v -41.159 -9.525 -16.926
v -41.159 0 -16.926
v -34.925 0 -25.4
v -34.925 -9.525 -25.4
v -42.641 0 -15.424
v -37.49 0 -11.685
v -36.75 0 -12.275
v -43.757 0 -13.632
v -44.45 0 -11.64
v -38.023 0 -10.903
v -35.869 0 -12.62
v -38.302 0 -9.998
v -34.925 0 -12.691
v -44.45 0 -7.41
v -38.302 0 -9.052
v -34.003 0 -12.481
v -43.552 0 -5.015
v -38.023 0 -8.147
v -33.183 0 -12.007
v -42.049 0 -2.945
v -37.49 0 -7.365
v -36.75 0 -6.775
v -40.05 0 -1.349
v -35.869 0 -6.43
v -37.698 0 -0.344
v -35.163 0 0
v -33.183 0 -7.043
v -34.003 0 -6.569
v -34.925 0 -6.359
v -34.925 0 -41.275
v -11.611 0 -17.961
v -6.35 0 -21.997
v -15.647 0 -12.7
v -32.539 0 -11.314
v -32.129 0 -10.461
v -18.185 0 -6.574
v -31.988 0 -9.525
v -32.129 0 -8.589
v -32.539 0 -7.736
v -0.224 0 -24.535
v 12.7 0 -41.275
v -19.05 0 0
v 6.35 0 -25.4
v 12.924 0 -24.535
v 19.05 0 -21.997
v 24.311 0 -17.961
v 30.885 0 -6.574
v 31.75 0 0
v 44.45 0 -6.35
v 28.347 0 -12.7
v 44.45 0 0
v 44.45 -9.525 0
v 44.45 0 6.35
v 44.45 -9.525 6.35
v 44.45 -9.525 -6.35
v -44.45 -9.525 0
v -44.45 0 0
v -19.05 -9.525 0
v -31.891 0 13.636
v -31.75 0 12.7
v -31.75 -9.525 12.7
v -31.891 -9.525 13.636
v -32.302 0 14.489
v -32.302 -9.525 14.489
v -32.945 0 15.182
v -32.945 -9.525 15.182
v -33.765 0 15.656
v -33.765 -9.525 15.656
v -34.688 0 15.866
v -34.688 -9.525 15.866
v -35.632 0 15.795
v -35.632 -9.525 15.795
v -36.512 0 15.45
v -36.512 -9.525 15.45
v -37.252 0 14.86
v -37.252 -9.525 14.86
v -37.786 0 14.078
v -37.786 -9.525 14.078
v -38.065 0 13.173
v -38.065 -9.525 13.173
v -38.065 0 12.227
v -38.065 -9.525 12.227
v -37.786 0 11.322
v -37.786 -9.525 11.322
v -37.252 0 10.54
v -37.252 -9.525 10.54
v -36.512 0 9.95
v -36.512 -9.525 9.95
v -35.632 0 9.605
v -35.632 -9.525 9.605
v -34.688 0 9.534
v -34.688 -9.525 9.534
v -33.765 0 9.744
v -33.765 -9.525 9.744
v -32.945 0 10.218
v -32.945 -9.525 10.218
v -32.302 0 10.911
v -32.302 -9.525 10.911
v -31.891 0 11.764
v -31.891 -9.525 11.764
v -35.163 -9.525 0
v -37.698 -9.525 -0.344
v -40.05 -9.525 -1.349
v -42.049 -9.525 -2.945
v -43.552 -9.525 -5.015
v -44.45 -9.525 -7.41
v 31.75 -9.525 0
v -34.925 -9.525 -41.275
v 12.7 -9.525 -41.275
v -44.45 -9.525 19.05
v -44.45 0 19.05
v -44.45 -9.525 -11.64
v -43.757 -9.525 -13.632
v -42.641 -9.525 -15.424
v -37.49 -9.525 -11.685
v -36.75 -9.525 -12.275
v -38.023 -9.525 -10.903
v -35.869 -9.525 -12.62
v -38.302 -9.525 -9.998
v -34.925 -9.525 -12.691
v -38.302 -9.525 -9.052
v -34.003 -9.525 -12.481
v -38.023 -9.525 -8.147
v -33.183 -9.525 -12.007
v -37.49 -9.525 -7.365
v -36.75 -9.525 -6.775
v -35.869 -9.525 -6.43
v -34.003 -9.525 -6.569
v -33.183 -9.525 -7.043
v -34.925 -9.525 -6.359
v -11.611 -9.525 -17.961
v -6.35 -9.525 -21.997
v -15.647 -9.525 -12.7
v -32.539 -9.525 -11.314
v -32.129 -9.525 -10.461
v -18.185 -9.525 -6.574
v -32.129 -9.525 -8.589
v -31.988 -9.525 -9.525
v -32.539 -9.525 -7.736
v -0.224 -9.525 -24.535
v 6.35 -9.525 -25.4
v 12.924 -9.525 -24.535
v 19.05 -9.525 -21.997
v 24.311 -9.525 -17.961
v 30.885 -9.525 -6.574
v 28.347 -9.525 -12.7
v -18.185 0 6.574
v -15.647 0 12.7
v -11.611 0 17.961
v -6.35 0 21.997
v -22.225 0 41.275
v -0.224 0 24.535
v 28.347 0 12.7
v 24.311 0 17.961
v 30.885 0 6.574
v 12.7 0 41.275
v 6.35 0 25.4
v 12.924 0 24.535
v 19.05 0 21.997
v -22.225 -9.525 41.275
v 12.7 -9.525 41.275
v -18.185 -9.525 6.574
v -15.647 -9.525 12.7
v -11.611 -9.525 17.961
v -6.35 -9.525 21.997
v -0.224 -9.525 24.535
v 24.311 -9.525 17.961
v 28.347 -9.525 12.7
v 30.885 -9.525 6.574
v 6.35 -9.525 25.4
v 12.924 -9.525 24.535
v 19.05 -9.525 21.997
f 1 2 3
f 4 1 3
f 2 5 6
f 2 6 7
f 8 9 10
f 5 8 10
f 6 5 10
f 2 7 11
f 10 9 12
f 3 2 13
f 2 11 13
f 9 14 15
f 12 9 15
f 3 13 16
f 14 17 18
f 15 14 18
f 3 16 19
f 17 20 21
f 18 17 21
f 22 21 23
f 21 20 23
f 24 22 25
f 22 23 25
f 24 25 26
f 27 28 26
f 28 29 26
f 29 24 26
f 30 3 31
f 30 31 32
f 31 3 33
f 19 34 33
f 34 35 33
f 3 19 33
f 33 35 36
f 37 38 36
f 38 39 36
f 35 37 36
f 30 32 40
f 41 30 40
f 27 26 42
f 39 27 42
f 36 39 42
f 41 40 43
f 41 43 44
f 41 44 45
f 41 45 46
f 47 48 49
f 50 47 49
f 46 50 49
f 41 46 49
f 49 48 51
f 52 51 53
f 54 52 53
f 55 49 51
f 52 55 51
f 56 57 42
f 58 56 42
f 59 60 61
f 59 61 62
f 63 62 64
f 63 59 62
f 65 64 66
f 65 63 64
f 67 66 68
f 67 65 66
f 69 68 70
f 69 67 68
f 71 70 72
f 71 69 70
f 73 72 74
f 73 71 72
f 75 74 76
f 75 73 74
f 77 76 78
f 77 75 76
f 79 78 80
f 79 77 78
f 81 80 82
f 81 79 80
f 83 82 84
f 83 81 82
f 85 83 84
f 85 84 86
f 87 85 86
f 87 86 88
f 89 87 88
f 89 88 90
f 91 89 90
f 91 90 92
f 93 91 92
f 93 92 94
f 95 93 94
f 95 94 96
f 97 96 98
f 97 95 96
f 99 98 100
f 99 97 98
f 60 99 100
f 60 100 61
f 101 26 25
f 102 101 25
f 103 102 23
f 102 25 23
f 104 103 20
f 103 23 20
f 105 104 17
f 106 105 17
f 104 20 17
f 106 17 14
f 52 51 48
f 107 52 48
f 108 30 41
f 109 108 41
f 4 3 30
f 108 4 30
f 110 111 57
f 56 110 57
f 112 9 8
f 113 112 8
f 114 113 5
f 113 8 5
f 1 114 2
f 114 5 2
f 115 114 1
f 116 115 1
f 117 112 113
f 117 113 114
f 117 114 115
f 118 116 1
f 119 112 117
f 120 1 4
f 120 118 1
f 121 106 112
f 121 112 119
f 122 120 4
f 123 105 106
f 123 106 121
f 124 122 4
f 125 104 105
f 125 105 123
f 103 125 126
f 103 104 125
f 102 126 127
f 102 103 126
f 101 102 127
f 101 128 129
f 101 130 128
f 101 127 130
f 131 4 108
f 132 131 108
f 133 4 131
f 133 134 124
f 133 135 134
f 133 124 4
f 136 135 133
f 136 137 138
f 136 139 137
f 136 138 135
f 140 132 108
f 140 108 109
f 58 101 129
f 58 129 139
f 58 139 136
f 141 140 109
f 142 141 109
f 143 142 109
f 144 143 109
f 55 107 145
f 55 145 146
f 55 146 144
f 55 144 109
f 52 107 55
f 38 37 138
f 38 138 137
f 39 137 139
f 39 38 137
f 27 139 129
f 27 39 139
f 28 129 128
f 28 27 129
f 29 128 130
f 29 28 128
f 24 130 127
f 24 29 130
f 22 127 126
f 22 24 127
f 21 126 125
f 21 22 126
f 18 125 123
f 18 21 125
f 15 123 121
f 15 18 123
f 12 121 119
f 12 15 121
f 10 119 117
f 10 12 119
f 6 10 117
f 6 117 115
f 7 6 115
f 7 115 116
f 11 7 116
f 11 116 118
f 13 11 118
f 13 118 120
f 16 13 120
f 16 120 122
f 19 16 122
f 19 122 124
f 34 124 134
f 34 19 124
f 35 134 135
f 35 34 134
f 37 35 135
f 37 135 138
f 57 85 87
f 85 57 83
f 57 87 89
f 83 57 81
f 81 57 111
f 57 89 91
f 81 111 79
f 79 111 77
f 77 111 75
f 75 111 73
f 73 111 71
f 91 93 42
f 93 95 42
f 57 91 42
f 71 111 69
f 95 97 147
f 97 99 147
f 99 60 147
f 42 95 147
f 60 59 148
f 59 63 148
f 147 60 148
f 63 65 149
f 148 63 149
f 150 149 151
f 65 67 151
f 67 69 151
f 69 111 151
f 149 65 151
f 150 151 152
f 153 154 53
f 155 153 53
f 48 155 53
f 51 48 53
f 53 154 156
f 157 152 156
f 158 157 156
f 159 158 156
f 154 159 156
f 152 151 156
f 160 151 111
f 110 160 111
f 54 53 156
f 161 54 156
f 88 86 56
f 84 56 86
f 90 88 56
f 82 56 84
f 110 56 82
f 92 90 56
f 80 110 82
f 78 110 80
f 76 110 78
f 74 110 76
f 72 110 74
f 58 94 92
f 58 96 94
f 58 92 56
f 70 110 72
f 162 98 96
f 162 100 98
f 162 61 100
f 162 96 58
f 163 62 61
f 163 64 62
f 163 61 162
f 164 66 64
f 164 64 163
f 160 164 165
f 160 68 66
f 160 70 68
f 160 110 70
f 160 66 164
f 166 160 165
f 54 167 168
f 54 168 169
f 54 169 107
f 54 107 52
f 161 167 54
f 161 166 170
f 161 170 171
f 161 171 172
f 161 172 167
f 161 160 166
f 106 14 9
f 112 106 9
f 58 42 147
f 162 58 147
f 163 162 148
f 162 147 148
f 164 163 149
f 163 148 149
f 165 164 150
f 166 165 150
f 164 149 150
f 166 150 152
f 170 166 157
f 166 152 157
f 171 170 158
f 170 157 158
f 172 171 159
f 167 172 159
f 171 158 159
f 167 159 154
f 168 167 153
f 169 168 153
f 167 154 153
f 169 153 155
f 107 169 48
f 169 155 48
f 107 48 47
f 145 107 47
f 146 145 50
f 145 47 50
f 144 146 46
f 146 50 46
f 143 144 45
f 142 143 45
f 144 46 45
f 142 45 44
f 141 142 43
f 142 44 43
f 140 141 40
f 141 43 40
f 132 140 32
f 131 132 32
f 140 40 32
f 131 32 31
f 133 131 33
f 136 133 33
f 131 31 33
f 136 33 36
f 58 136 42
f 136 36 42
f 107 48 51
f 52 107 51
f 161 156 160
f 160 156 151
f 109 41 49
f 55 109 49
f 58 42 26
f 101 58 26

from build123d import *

# Parameters (mm, degrees)
F0_R     = 3.175
F1_DEPTH = 9.525
F2_DEPTH = 9.525


with BuildPart() as f1:
    # F0 (on Front) → F1 (new body)
    with BuildSketch(Plane.XZ):
        with BuildLine():
            Line((12.7, 41.275), (-22.225, 41.275))
            Line((-22.225, 41.275), (-44.45, 19.05))
            Line((-44.45, 19.05), (-44.45, 0))
            Line((-44.45, 0), (-35.162684, 0))
            Line((-35.162684, 0), (-19.05, 0))
            ThreePointArc((-19.05, 0), (6.35, 25.4), (31.75, 0))
            Line((31.75, 0), (44.45, 0))
            Line((44.45, 0), (44.45, 6.35))
            Line((44.45, 6.35), (12.7, 41.275))
        make_face()
        with Locations((-34.925, 12.7)):
            Circle(F0_R, mode=Mode.SUBTRACT)
    extrude(amount=F1_DEPTH)


with BuildPart() as f2:
    # F0 (on Front) → F2 (new body)
    with BuildSketch(Plane.XZ):
        with BuildLine():
            Line((44.45, -6.35), (44.45, 0))
            Line((44.45, 0), (31.75, 0))
            ThreePointArc((31.75, 0), (6.35, -25.4), (-19.05, 0))
            Line((-19.05, 0), (-35.162684, 0))
            ThreePointArc((-35.162684, 0), (-41.103408, -2.079638), (-44.45, -7.410437))
            Line((-44.45, -7.410437), (-44.45, -11.639563))
            ThreePointArc((-44.45, -11.639563), (-43.24872, -14.559048), (-41.159166, -16.925528))
            Line((-41.159166, -16.925528), (-34.925, -25.4))
            Line((-34.925, -25.4), (-34.925, -41.275))
            Line((-34.925, -41.275), (12.7, -41.275))
            Line((12.7, -41.275), (44.45, -6.35))
        make_face()
        with Locations((-35.162684, -9.525)):
            Circle(F0_R, mode=Mode.SUBTRACT)
    extrude(amount=F2_DEPTH)


solid = Compound([f1.part, f2.part])
